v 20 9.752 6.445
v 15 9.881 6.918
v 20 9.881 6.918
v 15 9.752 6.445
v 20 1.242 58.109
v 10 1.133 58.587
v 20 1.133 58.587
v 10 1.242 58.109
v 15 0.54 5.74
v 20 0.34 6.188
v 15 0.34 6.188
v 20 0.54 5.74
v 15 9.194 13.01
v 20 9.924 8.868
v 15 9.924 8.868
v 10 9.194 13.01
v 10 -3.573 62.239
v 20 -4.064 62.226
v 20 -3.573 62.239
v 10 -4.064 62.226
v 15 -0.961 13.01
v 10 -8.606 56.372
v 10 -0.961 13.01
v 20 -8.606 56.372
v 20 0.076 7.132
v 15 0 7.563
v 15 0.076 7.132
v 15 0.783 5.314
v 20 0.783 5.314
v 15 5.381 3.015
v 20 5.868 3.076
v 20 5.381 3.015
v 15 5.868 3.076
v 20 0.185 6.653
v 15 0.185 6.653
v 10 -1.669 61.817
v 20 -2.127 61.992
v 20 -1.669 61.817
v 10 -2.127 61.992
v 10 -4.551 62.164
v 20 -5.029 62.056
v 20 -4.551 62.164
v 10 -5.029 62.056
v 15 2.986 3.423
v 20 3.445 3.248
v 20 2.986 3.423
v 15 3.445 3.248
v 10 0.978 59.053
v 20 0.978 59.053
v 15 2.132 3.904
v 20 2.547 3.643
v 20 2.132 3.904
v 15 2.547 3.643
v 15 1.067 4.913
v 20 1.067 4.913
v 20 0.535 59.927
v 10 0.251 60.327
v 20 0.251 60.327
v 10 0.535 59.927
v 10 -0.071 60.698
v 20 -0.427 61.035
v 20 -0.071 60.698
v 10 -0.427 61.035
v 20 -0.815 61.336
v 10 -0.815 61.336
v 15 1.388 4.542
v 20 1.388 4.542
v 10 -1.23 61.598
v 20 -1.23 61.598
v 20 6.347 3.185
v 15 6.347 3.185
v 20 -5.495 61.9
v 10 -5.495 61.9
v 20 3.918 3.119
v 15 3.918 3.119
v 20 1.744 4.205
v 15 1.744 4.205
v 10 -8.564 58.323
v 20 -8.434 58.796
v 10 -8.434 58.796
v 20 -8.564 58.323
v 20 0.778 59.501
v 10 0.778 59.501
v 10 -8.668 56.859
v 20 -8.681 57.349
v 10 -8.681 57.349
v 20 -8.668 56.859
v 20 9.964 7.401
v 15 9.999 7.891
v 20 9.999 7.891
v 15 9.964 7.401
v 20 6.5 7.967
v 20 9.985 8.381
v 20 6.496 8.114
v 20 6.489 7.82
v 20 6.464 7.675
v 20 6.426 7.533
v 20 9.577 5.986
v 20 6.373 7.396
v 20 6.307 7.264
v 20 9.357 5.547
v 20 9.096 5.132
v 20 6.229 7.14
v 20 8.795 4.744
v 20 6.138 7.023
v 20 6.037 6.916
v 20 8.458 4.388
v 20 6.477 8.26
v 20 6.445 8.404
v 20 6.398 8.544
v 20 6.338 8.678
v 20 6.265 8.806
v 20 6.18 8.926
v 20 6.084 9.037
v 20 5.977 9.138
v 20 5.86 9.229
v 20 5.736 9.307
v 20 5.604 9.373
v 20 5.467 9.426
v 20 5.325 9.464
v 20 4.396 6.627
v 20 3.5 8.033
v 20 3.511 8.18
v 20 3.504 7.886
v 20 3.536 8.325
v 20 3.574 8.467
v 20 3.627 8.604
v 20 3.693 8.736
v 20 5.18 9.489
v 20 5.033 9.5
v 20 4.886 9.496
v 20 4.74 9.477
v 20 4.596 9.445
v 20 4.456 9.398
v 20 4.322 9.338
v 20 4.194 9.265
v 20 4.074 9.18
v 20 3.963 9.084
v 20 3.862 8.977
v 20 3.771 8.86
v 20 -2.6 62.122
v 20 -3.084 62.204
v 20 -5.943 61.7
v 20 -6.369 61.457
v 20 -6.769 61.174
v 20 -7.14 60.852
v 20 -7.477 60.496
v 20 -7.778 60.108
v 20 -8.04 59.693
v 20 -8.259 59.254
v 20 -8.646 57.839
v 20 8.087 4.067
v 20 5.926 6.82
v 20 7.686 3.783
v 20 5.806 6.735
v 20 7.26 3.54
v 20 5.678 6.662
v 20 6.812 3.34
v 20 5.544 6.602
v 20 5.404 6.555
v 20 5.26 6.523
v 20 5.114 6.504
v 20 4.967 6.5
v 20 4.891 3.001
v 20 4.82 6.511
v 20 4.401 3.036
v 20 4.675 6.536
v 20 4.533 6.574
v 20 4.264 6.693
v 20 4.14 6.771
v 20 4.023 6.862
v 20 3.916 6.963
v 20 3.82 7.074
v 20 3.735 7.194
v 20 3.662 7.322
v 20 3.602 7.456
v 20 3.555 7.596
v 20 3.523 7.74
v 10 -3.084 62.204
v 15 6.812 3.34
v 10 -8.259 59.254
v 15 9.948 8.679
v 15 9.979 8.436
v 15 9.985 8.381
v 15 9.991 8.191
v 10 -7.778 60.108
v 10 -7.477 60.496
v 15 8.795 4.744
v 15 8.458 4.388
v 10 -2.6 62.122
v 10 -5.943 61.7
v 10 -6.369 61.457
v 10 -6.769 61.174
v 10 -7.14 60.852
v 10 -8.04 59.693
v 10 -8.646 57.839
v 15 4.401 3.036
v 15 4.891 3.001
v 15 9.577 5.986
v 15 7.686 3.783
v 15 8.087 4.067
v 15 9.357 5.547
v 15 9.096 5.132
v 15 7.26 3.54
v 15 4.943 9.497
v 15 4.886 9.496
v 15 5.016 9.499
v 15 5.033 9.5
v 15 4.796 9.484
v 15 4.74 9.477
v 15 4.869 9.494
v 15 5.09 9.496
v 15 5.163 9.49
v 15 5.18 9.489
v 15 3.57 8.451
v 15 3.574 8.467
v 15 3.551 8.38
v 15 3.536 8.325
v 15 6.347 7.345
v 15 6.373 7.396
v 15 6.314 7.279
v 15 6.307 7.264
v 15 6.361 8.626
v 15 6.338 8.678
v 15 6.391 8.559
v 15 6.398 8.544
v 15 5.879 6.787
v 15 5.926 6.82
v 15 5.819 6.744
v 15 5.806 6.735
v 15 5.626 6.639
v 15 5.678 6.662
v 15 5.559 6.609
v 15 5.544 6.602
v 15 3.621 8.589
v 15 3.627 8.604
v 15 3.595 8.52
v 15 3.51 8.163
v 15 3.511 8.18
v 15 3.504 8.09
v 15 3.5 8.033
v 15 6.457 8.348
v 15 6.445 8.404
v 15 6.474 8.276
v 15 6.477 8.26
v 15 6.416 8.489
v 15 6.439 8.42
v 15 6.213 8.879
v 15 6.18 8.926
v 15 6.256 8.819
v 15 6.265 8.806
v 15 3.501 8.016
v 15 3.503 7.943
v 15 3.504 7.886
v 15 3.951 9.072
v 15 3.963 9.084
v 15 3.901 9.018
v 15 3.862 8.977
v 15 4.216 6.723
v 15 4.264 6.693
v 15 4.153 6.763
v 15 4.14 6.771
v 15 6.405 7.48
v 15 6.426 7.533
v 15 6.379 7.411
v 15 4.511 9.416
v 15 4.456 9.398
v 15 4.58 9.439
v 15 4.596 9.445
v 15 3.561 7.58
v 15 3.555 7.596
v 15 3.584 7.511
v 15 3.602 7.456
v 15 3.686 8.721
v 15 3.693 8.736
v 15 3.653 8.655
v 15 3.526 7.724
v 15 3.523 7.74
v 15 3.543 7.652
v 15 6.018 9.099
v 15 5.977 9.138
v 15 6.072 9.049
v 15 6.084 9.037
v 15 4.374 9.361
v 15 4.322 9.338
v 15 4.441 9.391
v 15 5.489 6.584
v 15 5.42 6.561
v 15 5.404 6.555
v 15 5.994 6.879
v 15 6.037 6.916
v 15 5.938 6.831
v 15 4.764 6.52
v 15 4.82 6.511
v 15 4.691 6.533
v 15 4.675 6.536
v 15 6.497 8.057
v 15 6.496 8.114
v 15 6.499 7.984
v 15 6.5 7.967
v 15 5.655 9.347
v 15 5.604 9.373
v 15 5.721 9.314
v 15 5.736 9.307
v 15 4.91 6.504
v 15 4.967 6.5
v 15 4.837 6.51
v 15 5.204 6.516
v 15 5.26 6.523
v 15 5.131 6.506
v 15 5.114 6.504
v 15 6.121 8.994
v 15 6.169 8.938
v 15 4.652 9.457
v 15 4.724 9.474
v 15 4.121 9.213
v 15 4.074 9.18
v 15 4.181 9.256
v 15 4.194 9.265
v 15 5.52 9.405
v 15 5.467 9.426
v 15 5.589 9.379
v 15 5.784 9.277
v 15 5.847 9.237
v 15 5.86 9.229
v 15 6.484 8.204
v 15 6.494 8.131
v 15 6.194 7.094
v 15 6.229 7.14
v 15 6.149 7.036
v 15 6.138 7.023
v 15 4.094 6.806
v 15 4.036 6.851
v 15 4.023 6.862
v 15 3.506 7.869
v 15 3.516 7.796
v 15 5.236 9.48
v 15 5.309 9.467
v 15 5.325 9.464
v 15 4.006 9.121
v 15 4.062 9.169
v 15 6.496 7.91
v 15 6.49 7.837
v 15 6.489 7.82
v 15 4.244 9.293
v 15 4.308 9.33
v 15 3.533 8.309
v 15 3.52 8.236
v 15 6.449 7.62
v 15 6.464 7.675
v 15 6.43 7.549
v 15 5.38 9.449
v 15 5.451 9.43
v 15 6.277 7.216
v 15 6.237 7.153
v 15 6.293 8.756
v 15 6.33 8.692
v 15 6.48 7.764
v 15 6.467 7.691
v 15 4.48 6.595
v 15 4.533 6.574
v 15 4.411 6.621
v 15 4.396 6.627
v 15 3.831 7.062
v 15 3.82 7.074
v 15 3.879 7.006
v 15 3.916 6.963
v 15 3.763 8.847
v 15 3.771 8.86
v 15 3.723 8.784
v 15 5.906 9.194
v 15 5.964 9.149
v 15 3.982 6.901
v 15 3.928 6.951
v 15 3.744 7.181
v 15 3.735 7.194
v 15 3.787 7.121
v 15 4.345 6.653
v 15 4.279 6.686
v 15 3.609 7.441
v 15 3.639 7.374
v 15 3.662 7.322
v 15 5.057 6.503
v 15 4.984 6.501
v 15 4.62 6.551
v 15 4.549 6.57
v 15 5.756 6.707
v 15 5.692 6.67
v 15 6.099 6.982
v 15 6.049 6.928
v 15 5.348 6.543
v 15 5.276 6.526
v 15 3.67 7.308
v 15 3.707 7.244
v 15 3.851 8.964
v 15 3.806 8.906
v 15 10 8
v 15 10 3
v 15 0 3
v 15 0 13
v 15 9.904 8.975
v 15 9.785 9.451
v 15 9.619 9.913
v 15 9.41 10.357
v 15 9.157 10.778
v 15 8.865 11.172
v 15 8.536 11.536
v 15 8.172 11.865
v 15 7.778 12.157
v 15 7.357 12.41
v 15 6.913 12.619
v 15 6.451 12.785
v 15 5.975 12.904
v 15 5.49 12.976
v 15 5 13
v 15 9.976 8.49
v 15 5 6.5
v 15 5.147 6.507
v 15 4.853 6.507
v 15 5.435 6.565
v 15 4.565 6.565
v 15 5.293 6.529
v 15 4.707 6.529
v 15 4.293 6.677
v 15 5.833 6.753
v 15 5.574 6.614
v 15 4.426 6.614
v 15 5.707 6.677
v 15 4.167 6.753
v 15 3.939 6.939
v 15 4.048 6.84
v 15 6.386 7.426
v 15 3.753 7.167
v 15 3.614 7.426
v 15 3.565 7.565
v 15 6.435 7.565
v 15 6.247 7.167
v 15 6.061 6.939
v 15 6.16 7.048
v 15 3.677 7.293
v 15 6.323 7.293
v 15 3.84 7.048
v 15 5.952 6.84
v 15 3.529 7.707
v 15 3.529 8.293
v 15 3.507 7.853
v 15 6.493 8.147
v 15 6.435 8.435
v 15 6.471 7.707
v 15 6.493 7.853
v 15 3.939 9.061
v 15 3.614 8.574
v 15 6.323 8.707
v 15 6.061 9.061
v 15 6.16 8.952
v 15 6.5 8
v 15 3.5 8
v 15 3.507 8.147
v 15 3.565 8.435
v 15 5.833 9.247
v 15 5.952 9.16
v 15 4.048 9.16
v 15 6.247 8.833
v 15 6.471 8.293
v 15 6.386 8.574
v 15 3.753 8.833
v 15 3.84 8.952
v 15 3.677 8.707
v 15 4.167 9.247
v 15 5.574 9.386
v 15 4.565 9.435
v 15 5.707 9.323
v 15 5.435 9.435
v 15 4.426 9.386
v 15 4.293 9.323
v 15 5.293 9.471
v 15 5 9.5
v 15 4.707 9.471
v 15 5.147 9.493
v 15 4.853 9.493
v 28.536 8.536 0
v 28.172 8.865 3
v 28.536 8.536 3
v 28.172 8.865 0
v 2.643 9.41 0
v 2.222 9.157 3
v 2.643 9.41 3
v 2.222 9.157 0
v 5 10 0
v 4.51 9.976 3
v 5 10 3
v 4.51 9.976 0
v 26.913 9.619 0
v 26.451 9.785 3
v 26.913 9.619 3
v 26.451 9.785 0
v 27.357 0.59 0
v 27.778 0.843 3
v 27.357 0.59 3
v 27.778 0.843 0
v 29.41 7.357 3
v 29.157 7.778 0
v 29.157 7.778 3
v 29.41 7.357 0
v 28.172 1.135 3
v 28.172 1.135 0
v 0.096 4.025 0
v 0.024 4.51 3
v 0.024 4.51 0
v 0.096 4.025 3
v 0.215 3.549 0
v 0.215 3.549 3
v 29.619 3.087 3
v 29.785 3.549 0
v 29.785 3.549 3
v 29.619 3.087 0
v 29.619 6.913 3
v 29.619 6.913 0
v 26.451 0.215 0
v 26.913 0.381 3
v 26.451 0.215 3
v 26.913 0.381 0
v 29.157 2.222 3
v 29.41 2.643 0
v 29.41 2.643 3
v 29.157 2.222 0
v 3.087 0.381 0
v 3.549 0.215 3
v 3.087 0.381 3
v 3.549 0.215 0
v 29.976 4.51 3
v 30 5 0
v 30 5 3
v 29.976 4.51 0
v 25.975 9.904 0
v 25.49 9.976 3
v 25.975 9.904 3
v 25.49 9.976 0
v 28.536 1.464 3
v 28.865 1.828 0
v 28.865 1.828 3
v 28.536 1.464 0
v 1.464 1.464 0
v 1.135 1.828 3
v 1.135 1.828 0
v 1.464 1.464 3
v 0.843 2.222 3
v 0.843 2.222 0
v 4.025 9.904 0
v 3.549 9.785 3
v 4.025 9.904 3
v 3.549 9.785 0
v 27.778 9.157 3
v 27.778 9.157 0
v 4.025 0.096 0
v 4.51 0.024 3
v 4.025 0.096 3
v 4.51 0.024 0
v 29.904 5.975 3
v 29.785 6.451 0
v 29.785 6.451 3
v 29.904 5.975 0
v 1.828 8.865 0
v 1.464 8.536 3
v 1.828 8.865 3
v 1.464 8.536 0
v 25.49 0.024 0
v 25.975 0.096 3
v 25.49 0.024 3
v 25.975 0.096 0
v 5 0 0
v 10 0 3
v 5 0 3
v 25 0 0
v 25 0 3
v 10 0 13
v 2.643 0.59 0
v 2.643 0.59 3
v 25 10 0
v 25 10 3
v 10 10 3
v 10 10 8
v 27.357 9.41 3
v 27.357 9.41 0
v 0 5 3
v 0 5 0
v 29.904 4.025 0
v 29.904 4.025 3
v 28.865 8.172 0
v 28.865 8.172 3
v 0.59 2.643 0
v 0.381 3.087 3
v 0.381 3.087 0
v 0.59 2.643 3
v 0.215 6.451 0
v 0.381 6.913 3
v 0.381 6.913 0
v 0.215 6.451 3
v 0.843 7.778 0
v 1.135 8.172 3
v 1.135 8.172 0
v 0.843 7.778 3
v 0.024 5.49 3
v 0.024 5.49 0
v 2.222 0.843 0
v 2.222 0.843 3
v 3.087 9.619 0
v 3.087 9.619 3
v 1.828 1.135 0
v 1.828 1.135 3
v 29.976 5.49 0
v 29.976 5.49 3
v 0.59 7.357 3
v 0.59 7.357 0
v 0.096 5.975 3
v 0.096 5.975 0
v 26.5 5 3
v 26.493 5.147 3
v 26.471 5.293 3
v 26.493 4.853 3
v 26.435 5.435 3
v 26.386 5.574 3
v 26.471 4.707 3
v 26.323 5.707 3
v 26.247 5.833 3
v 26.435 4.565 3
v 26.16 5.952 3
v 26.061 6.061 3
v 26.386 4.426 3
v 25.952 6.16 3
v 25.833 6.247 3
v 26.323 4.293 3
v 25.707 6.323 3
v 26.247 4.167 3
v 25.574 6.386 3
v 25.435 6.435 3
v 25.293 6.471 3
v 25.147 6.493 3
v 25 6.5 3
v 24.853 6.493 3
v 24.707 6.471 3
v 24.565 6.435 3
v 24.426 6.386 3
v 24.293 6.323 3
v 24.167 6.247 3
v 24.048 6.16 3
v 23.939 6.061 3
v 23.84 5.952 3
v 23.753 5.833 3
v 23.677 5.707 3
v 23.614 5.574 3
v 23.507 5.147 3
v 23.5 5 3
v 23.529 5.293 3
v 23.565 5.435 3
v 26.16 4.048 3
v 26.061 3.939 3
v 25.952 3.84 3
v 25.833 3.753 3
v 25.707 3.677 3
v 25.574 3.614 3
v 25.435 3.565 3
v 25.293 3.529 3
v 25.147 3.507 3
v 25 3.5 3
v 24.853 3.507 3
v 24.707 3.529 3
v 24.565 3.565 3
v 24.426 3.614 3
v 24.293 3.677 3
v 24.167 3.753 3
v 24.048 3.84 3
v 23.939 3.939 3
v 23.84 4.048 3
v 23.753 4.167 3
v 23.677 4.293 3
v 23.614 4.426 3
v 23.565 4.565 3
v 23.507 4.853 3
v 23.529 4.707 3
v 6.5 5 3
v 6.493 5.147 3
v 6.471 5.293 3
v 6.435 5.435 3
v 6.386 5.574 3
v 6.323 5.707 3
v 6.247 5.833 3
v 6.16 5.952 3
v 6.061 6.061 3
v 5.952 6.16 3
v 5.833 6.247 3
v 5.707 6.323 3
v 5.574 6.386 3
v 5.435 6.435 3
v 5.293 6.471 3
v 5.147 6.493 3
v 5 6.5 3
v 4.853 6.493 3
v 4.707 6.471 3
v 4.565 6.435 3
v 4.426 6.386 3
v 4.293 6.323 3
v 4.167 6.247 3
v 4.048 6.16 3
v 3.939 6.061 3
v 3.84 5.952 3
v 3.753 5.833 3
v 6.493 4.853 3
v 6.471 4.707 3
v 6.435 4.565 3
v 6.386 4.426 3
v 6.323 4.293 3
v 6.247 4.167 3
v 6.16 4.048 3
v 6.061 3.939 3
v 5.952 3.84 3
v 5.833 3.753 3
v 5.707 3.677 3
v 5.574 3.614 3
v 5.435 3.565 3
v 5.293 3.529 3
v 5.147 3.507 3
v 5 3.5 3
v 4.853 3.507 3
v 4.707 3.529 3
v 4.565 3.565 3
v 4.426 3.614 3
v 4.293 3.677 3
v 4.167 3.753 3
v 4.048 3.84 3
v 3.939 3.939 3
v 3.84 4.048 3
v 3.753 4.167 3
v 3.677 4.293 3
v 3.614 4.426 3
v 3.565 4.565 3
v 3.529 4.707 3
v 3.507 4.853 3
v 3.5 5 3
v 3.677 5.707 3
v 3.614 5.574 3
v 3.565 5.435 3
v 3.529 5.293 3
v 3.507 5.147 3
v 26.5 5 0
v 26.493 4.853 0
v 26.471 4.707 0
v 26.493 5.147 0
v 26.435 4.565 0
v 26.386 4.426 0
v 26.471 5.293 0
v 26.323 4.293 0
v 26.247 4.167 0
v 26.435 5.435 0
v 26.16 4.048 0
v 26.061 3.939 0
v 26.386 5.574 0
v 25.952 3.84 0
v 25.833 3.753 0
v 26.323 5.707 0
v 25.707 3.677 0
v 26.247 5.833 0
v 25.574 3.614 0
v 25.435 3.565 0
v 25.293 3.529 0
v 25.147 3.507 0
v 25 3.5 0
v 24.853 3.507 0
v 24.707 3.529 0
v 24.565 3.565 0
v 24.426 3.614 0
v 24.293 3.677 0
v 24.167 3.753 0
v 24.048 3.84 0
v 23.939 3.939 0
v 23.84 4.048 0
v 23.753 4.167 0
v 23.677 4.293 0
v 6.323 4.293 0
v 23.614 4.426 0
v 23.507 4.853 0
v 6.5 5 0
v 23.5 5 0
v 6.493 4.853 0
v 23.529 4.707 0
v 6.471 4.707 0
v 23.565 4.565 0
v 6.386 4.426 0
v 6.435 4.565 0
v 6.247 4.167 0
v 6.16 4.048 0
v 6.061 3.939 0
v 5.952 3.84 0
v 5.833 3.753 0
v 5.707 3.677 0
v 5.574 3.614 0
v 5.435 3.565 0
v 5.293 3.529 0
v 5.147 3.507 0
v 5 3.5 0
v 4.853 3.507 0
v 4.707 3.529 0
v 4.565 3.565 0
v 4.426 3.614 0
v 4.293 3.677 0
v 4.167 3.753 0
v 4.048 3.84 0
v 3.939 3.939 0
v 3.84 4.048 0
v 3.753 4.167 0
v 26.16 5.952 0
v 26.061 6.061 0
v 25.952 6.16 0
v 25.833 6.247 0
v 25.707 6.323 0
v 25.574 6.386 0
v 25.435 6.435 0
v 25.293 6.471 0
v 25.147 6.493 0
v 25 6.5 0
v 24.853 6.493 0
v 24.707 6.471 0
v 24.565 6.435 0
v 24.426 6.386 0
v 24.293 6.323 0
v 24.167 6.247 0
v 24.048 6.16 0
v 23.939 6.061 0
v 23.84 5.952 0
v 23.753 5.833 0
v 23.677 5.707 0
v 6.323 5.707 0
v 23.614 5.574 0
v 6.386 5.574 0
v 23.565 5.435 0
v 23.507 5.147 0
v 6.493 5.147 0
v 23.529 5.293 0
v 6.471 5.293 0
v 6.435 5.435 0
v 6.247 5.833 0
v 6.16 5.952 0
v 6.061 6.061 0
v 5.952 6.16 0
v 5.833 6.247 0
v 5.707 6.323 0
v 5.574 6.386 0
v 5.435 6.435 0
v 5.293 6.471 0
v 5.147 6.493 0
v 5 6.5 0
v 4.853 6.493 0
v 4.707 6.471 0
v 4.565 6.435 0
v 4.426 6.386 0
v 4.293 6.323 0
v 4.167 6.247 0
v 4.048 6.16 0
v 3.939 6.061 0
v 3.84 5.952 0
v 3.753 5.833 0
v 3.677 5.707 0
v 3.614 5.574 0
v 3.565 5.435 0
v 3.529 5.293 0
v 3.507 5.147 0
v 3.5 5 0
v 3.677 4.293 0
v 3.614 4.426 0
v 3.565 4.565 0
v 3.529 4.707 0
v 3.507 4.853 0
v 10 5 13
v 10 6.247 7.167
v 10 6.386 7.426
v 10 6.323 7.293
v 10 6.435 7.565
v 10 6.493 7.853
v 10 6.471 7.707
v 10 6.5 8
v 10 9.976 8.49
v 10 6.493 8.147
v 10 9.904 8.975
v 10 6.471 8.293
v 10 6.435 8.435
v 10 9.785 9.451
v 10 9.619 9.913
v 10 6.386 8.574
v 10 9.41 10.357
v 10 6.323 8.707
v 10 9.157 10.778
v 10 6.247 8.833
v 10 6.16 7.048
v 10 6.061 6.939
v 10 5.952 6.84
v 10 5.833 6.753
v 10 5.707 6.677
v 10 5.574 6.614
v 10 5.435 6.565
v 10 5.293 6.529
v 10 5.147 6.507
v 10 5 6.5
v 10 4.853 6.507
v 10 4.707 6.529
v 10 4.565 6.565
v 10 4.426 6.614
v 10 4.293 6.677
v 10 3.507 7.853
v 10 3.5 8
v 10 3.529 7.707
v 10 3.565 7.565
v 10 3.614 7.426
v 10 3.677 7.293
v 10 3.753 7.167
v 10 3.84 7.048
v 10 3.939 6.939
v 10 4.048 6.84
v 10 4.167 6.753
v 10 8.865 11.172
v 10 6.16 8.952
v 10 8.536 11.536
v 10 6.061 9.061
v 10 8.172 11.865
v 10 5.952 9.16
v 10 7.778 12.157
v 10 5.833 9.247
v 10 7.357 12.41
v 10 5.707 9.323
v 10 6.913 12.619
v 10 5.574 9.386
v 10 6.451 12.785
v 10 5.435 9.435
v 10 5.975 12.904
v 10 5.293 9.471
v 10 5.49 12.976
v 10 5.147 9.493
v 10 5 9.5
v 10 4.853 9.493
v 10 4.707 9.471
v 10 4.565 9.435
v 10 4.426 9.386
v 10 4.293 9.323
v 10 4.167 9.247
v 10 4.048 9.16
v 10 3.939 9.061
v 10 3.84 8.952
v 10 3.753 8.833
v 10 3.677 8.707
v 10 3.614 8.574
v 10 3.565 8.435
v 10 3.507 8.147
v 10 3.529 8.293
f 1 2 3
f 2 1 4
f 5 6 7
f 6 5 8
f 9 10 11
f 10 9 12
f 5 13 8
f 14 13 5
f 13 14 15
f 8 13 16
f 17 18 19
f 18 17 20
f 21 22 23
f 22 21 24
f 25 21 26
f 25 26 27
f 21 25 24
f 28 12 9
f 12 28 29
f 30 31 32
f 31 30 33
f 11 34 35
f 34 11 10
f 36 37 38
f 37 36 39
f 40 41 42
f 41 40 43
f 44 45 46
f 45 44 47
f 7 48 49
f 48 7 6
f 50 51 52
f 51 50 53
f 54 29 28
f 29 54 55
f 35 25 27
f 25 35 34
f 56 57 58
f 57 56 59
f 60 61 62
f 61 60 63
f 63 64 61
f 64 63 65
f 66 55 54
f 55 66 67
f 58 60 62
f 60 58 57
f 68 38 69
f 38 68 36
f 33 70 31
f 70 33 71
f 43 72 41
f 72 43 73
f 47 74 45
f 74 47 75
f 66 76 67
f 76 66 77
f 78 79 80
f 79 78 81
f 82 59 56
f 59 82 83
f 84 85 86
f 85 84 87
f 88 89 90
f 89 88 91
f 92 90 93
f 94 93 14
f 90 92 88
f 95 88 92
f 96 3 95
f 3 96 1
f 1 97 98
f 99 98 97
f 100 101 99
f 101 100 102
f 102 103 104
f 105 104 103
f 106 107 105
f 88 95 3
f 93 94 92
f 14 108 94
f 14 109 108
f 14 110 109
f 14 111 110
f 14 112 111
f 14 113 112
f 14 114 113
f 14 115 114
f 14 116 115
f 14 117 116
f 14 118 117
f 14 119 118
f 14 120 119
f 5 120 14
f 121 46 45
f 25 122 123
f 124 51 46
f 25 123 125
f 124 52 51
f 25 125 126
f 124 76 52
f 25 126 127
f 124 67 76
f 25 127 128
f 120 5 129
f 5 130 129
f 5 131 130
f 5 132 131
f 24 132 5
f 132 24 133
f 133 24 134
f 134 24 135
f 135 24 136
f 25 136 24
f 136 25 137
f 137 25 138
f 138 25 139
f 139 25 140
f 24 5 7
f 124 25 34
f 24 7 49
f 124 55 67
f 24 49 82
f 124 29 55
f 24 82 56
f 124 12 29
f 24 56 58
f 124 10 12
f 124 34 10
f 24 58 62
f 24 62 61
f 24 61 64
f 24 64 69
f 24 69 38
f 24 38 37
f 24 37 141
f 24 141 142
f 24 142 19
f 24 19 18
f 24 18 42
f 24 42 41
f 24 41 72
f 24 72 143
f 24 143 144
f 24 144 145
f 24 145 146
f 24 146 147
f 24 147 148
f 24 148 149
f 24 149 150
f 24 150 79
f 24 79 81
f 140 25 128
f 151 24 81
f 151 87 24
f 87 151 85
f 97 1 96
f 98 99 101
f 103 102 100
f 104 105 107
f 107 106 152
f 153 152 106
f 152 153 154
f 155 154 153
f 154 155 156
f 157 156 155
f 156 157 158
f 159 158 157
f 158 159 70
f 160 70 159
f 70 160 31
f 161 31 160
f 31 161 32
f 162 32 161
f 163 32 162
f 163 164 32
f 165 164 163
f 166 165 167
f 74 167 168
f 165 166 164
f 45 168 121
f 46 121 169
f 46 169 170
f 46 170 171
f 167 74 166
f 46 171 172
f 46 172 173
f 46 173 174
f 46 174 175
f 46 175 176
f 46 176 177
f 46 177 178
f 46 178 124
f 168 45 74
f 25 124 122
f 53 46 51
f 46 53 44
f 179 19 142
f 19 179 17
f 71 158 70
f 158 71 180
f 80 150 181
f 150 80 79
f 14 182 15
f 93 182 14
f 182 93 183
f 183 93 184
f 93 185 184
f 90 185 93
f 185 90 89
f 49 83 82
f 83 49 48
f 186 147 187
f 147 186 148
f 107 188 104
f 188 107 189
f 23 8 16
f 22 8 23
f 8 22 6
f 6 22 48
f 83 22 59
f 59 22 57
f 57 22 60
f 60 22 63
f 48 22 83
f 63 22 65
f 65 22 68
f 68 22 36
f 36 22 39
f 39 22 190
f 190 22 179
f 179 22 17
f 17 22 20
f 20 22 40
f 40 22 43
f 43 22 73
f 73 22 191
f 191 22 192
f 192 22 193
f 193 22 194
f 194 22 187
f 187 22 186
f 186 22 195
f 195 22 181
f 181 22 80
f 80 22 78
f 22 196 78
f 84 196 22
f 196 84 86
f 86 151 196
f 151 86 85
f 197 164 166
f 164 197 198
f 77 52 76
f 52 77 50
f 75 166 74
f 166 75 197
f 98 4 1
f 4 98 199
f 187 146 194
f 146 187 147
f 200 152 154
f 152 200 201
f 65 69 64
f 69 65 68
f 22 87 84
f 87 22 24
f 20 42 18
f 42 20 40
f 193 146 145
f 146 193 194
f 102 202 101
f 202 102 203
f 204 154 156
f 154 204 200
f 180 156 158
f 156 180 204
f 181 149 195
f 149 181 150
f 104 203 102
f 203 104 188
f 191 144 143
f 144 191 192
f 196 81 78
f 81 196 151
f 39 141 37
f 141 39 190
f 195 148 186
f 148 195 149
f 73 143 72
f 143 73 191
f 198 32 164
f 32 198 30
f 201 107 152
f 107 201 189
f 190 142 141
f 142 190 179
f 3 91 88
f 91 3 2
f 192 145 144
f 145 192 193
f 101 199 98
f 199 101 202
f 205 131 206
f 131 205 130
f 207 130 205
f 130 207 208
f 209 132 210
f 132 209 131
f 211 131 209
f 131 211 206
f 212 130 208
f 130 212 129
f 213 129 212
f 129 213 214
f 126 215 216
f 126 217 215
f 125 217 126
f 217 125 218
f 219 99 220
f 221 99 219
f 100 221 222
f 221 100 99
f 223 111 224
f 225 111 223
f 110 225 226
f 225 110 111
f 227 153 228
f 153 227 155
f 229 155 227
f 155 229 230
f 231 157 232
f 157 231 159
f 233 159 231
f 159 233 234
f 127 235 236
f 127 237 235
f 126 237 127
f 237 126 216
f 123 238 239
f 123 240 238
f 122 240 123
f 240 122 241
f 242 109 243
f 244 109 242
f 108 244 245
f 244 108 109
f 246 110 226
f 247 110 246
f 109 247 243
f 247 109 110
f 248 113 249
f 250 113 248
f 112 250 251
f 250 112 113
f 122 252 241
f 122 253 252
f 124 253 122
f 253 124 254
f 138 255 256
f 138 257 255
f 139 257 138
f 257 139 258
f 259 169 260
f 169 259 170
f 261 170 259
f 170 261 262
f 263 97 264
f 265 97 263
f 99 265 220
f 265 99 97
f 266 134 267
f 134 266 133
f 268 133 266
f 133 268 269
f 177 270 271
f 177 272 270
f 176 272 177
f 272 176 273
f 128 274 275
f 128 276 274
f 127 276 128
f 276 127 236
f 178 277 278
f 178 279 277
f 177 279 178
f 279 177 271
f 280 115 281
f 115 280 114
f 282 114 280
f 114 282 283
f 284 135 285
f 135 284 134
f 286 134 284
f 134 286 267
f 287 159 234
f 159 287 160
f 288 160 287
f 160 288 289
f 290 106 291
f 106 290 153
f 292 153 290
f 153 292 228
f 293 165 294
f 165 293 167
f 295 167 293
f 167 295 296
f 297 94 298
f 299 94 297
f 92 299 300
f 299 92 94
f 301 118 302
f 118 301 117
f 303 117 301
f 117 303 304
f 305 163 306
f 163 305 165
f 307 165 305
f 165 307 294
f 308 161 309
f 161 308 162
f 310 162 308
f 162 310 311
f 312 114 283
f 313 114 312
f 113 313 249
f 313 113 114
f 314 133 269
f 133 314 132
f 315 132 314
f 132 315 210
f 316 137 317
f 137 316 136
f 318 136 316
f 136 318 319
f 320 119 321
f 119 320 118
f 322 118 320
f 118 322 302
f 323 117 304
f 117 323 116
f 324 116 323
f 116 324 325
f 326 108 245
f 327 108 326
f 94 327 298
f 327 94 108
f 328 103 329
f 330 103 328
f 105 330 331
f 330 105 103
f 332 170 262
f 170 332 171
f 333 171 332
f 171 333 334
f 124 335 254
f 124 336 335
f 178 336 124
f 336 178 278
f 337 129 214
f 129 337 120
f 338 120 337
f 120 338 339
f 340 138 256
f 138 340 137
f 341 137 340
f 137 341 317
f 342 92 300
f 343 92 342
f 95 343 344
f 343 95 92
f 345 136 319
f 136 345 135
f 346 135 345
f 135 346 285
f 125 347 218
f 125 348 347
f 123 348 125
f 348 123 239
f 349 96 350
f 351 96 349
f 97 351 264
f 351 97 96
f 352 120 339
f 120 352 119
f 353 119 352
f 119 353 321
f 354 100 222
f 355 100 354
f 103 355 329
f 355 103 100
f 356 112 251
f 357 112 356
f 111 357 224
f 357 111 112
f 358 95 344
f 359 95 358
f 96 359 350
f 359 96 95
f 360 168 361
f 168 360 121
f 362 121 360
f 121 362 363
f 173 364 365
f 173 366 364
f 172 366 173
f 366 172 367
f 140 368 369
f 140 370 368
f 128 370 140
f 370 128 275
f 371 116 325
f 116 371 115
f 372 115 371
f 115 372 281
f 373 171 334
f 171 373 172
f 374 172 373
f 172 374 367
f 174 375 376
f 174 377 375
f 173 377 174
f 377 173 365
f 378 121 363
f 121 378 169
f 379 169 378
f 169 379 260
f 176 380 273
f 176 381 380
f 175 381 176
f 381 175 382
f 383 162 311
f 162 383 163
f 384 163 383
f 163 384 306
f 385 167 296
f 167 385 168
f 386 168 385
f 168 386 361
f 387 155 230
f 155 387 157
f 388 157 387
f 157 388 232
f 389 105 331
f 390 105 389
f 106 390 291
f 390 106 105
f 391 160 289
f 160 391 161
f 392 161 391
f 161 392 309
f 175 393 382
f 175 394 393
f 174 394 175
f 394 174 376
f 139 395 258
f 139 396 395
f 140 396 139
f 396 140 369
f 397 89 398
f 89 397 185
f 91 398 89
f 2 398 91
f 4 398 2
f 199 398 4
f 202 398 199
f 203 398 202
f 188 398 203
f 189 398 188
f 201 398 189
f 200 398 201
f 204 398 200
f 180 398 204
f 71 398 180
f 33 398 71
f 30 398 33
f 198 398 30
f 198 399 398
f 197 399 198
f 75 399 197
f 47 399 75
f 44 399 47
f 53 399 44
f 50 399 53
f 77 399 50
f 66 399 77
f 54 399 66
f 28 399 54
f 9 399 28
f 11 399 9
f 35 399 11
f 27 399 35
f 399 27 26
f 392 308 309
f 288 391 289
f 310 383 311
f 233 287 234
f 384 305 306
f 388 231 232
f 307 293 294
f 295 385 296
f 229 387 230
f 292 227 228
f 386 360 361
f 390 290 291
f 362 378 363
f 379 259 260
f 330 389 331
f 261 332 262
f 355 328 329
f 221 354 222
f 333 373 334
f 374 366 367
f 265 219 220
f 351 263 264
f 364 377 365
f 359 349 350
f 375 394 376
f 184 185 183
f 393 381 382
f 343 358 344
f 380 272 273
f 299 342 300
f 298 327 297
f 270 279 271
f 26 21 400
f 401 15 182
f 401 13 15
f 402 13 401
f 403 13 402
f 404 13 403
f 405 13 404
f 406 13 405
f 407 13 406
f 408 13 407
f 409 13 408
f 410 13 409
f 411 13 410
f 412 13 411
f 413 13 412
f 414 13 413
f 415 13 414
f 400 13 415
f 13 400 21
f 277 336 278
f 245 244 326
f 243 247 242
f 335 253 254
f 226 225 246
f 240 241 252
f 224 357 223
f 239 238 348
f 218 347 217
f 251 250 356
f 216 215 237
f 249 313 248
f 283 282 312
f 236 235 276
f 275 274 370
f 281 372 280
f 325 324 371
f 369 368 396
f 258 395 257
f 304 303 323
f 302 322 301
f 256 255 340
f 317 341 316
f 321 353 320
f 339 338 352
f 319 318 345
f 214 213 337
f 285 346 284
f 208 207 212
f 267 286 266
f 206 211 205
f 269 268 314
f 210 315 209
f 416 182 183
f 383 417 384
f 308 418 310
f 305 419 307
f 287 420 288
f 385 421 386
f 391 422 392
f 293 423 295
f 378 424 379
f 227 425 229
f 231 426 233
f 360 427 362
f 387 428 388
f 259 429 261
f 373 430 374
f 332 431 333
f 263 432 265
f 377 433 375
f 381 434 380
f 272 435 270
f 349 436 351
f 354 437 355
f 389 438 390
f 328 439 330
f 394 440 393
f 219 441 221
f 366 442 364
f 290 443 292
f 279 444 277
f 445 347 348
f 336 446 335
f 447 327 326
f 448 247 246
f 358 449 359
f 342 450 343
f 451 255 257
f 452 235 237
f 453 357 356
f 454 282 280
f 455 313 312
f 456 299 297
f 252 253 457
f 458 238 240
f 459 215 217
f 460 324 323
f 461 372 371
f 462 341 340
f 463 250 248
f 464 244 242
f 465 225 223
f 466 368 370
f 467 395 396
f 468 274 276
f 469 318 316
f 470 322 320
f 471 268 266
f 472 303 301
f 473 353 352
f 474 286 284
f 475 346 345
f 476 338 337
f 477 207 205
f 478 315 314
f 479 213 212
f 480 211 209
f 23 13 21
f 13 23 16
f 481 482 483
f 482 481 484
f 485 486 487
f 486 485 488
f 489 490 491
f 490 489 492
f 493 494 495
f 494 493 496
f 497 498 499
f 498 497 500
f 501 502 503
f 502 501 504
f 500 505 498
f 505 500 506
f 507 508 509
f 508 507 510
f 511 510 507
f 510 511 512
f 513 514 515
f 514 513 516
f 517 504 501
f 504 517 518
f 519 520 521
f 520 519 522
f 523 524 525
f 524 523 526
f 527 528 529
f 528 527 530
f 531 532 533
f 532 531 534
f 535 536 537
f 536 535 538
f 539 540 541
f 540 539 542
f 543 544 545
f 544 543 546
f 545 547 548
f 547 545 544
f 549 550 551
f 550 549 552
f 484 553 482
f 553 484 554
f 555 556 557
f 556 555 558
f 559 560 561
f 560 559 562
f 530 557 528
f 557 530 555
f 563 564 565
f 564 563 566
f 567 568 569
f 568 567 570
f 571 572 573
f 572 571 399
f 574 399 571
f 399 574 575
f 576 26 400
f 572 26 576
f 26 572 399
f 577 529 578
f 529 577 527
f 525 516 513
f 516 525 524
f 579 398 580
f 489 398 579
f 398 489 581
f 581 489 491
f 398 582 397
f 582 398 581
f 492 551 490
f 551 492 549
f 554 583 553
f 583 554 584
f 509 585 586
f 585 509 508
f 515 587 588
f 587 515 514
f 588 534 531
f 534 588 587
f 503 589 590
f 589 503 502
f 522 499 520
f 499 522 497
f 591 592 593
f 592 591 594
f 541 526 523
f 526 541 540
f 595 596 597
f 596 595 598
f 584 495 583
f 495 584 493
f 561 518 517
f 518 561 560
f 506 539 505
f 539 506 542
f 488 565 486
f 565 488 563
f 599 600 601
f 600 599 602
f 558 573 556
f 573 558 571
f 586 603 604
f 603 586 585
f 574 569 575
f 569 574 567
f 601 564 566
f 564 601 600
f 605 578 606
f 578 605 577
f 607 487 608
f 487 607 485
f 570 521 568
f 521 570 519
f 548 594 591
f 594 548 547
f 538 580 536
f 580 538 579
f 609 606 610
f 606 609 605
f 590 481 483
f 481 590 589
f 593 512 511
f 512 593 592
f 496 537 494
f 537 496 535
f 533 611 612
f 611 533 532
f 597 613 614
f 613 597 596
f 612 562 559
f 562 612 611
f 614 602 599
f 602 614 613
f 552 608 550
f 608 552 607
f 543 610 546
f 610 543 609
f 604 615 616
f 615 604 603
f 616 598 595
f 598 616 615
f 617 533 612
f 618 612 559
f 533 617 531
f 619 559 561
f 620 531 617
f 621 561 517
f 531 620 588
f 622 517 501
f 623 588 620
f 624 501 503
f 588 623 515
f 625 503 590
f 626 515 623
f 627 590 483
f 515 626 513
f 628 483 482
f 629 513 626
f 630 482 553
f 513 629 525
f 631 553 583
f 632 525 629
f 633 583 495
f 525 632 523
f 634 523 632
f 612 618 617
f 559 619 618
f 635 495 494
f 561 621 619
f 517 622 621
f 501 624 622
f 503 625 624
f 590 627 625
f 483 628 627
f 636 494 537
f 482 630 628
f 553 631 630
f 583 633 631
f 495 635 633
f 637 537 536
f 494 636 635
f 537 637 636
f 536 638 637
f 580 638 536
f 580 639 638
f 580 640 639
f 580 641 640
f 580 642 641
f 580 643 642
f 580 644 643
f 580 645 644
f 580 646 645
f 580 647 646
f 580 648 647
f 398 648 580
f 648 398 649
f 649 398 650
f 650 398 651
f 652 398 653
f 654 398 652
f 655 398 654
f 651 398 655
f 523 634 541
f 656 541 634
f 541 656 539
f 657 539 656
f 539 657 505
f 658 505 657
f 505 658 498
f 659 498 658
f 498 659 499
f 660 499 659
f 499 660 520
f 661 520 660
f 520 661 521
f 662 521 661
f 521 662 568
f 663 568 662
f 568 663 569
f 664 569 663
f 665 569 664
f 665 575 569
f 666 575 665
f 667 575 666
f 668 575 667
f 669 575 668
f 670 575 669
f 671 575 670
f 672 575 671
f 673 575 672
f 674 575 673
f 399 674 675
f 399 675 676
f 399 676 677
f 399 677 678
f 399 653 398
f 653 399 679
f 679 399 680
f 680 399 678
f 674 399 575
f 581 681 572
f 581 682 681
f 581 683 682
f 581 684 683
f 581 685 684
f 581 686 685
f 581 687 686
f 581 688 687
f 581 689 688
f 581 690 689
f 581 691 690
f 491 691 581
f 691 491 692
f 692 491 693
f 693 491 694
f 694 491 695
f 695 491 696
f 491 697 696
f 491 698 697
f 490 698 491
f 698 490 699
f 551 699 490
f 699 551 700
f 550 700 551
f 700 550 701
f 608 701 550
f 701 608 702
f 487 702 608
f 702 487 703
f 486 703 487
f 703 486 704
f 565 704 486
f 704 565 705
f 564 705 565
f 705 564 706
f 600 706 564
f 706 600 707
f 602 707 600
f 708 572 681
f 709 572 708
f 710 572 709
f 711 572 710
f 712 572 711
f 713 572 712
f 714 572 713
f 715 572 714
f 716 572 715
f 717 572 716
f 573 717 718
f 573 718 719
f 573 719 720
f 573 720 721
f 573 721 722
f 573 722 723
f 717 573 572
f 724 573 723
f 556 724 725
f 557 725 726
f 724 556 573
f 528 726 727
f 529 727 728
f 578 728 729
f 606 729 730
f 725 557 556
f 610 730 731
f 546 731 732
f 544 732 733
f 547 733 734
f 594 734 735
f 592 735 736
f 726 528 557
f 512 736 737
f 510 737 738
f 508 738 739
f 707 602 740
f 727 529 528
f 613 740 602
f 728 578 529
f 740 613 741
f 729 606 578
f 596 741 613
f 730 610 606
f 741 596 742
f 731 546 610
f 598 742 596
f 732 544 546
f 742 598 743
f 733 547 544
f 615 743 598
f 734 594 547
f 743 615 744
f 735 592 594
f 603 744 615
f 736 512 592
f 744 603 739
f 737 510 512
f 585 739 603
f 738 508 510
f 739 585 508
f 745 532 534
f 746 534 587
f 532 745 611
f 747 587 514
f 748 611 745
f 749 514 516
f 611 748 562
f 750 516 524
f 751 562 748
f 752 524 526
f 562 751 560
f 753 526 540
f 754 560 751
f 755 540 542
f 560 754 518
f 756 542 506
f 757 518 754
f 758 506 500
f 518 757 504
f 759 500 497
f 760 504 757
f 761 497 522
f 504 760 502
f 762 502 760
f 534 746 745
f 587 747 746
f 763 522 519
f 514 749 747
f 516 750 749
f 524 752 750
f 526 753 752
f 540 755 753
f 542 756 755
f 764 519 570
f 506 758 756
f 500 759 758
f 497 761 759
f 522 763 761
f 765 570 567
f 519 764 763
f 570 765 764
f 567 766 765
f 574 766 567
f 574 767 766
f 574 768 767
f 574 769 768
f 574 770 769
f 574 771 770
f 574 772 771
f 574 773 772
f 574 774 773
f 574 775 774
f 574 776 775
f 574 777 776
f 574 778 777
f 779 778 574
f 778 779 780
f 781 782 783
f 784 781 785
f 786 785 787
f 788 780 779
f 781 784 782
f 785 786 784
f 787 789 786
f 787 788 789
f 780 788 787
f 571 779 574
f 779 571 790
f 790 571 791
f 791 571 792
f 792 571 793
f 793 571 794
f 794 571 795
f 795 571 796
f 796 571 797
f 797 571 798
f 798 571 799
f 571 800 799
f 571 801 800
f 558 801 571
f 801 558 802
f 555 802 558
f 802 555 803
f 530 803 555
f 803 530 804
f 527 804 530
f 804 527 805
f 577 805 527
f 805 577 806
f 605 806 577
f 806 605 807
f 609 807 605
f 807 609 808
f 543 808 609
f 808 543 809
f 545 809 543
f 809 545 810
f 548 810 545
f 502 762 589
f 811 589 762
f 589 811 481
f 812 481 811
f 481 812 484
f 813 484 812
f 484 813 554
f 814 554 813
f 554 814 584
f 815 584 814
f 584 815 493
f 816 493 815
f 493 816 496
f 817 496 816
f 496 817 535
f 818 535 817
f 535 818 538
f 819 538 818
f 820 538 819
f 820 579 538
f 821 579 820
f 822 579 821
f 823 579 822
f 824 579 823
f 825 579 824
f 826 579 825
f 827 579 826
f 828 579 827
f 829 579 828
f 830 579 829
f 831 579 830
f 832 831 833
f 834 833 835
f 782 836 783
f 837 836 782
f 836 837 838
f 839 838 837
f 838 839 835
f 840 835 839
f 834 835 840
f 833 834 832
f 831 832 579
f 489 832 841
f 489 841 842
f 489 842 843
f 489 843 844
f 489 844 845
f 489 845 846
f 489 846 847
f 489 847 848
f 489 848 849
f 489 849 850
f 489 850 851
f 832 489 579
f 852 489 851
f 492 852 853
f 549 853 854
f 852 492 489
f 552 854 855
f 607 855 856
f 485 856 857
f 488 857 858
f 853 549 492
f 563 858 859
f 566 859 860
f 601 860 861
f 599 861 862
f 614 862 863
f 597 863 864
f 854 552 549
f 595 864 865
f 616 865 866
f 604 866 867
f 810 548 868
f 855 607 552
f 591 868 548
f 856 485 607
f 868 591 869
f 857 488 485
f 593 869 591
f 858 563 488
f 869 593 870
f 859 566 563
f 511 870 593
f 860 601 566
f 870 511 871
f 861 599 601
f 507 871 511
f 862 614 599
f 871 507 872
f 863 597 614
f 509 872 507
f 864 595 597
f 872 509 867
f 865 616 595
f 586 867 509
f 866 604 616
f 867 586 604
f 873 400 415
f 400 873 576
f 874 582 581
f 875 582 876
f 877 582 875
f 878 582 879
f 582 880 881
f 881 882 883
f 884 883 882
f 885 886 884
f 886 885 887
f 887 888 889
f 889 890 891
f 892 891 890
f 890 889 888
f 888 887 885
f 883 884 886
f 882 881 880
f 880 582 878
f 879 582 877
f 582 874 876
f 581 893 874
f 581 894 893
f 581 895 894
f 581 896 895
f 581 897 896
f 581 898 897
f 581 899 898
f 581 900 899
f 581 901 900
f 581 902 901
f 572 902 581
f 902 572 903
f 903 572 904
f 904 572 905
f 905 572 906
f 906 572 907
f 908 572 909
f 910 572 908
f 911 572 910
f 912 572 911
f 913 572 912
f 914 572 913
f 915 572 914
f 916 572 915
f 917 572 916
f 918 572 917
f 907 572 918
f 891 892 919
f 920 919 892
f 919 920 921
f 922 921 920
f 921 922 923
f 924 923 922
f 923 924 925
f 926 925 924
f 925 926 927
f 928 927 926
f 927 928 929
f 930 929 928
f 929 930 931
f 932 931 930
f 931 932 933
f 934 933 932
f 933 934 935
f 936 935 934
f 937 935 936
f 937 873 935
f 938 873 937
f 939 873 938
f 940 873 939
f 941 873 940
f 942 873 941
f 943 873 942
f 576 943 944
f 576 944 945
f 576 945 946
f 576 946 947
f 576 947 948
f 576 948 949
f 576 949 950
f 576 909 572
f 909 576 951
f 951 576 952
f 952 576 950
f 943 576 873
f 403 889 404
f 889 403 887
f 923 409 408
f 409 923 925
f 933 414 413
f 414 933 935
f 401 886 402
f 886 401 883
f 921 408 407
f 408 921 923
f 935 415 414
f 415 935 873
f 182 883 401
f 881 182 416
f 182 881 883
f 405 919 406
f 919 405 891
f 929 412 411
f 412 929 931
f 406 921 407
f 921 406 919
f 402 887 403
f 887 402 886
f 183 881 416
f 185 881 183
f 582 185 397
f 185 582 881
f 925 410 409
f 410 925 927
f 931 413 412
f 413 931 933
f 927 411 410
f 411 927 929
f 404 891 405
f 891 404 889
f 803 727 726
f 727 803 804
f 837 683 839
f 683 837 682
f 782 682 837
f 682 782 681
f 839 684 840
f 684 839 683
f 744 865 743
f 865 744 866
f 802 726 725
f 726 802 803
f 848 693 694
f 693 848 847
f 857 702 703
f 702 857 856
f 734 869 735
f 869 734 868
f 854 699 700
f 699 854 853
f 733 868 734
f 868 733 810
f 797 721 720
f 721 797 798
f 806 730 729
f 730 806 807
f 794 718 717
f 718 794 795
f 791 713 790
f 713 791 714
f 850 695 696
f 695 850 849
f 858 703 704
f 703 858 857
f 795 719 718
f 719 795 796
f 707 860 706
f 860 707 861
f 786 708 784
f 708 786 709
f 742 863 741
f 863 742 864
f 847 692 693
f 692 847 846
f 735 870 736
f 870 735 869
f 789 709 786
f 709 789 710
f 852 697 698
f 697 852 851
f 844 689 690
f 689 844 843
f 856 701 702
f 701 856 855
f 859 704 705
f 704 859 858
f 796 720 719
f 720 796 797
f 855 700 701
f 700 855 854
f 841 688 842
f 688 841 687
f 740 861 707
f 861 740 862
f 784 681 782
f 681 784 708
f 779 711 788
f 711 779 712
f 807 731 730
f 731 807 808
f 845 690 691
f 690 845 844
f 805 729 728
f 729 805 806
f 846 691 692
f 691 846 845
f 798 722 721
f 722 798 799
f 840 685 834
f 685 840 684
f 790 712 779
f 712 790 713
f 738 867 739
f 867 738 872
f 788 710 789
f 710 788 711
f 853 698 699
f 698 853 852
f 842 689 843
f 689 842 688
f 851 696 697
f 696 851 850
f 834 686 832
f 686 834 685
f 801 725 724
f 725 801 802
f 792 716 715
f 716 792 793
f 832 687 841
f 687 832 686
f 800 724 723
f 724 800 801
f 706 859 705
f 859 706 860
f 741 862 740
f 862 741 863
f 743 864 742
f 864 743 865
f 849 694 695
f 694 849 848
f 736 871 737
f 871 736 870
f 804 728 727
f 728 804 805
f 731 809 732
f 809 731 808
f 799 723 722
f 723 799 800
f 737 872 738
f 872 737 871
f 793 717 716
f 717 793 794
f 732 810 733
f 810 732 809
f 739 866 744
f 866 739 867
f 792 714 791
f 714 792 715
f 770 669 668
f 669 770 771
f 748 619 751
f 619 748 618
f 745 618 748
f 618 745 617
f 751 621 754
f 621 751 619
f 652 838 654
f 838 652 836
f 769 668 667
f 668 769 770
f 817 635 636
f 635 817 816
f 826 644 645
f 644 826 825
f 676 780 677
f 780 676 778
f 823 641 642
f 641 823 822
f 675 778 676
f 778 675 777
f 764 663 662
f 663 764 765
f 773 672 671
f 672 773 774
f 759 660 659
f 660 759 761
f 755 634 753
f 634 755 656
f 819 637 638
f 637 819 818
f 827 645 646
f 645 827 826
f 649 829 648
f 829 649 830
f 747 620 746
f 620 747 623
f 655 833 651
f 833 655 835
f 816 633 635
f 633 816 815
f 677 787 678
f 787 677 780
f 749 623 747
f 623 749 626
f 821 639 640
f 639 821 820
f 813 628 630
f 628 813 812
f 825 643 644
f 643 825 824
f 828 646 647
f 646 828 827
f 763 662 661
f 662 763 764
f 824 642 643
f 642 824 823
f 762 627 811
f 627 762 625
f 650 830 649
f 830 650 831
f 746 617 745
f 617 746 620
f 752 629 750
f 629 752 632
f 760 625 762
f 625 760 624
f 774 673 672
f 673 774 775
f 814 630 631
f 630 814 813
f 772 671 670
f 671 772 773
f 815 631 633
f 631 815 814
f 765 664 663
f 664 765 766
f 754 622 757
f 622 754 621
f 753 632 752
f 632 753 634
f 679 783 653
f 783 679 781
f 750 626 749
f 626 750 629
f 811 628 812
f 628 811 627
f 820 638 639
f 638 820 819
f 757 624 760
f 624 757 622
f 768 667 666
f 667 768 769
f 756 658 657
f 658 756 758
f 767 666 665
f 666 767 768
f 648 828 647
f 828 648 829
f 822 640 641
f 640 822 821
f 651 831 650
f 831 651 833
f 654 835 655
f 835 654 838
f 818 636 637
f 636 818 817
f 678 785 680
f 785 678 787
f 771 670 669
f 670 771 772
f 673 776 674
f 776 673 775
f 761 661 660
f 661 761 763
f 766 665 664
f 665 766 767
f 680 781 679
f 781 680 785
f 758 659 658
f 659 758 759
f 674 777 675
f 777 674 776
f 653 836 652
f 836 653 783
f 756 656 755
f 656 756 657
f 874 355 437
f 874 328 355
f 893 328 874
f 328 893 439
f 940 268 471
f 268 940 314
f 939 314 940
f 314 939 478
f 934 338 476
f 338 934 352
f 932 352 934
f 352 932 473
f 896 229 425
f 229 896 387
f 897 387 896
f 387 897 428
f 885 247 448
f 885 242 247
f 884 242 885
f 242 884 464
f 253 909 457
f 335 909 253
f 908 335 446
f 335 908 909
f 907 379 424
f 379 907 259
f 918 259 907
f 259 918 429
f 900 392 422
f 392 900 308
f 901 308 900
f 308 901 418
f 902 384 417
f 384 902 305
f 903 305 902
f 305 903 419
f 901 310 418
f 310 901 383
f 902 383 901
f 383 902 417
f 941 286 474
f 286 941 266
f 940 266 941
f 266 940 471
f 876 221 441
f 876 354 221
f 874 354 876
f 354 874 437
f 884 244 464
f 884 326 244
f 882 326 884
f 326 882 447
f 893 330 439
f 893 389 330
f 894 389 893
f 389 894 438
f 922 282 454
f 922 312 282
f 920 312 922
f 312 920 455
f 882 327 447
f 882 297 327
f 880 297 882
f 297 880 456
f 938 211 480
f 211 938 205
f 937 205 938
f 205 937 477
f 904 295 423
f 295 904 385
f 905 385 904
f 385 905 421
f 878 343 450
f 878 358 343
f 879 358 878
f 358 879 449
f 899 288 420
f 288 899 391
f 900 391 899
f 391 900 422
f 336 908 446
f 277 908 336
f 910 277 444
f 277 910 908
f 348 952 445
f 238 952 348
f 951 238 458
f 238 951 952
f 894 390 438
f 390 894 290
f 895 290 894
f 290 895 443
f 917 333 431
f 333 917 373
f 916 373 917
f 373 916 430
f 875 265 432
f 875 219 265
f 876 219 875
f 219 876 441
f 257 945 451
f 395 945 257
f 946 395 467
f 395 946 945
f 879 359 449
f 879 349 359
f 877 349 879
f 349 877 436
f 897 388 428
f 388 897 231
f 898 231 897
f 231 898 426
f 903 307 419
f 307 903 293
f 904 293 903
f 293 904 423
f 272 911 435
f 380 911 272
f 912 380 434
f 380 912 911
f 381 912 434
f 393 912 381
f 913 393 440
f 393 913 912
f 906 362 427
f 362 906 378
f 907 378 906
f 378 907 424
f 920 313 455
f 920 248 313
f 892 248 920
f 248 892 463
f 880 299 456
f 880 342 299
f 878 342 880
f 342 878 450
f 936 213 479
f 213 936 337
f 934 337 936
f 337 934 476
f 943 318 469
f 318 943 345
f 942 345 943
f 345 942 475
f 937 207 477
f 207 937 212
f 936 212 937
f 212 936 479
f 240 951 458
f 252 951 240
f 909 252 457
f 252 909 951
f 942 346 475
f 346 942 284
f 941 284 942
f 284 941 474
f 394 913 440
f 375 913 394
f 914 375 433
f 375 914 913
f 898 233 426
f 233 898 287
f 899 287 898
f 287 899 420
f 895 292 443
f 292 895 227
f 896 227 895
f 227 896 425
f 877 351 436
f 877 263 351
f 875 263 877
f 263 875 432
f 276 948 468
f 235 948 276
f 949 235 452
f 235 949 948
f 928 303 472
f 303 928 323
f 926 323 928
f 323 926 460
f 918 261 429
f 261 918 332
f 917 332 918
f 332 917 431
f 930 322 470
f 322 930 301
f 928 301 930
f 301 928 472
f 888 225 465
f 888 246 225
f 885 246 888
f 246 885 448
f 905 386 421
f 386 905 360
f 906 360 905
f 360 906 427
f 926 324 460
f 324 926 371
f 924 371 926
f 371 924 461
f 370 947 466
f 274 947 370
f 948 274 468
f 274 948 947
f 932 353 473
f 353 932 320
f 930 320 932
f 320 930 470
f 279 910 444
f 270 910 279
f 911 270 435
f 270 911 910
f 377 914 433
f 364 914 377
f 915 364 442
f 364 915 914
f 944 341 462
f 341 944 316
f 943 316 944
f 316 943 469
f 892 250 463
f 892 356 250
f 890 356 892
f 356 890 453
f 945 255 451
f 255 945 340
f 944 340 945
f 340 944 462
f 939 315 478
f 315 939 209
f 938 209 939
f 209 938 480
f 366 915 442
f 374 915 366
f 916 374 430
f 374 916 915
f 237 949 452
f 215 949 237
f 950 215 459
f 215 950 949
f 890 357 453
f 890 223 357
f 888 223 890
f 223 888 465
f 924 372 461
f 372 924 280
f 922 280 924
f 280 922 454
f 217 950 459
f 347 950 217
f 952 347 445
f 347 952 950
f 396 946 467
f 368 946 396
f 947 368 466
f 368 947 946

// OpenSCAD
$fn=64;
bissl=1/100;

part="NOSTL_assembly";//[NOSTL_assembly,hinge,foot]
wall=3;
angle=10;
length=60;
thickness=10;
hole=3;
module hinge() {
  difference() {
    union() {
      //cube([3*thickness,thickness,wall]);
      hull() {
        translate([thickness/2,thickness/2,0])cylinder(d=thickness,h=wall);
        translate([5*thickness/2,thickness/2,0])cylinder(d=thickness,h=wall);
      }
      translate([thickness,0,wall])cube([thickness/2,thickness/2,thickness]);
      translate([thickness,0,wall])cube([thickness/2,thickness,thickness/2]);
      translate([thickness,thickness/2,wall+thickness/2])rotate([0,90,0])cylinder(d=thickness,h=thickness/2);
    }
    translate([thickness/2,thickness/2,-bissl])cylinder(d=hole,h=wall+2*bissl);
    translate([5*thickness/2,thickness/2,-bissl])cylinder(d=hole,h=wall+2*bissl);
    translate([thickness-bissl,thickness/2,wall+thickness/2])rotate([0,90,0])cylinder(d=hole,h=thickness/2+2*bissl);
  }
}
module foot() {
  difference() {
    hull() {
      cylinder(d=thickness,h=thickness);
      translate([length-thickness,0,0]) cylinder(d=thickness,h=thickness);
    }
  translate([0,0,-bissl])cylinder(d=hole,h=thickness+2*bissl);
  rotate([0,0,angle])translate([-thickness/2-bissl,-length/2,thickness/2]) cube([thickness+2*bissl,length,thickness]);
  }
}
if (part=="hinge") hinge();
if (part=="foot") foot();
if (part=="NOSTL_assembly") {
  translate([2*thickness,thickness/2,wall+thickness/2])rotate([angle,0,0])rotate([0,-90,0])foot();
  hinge();
}
